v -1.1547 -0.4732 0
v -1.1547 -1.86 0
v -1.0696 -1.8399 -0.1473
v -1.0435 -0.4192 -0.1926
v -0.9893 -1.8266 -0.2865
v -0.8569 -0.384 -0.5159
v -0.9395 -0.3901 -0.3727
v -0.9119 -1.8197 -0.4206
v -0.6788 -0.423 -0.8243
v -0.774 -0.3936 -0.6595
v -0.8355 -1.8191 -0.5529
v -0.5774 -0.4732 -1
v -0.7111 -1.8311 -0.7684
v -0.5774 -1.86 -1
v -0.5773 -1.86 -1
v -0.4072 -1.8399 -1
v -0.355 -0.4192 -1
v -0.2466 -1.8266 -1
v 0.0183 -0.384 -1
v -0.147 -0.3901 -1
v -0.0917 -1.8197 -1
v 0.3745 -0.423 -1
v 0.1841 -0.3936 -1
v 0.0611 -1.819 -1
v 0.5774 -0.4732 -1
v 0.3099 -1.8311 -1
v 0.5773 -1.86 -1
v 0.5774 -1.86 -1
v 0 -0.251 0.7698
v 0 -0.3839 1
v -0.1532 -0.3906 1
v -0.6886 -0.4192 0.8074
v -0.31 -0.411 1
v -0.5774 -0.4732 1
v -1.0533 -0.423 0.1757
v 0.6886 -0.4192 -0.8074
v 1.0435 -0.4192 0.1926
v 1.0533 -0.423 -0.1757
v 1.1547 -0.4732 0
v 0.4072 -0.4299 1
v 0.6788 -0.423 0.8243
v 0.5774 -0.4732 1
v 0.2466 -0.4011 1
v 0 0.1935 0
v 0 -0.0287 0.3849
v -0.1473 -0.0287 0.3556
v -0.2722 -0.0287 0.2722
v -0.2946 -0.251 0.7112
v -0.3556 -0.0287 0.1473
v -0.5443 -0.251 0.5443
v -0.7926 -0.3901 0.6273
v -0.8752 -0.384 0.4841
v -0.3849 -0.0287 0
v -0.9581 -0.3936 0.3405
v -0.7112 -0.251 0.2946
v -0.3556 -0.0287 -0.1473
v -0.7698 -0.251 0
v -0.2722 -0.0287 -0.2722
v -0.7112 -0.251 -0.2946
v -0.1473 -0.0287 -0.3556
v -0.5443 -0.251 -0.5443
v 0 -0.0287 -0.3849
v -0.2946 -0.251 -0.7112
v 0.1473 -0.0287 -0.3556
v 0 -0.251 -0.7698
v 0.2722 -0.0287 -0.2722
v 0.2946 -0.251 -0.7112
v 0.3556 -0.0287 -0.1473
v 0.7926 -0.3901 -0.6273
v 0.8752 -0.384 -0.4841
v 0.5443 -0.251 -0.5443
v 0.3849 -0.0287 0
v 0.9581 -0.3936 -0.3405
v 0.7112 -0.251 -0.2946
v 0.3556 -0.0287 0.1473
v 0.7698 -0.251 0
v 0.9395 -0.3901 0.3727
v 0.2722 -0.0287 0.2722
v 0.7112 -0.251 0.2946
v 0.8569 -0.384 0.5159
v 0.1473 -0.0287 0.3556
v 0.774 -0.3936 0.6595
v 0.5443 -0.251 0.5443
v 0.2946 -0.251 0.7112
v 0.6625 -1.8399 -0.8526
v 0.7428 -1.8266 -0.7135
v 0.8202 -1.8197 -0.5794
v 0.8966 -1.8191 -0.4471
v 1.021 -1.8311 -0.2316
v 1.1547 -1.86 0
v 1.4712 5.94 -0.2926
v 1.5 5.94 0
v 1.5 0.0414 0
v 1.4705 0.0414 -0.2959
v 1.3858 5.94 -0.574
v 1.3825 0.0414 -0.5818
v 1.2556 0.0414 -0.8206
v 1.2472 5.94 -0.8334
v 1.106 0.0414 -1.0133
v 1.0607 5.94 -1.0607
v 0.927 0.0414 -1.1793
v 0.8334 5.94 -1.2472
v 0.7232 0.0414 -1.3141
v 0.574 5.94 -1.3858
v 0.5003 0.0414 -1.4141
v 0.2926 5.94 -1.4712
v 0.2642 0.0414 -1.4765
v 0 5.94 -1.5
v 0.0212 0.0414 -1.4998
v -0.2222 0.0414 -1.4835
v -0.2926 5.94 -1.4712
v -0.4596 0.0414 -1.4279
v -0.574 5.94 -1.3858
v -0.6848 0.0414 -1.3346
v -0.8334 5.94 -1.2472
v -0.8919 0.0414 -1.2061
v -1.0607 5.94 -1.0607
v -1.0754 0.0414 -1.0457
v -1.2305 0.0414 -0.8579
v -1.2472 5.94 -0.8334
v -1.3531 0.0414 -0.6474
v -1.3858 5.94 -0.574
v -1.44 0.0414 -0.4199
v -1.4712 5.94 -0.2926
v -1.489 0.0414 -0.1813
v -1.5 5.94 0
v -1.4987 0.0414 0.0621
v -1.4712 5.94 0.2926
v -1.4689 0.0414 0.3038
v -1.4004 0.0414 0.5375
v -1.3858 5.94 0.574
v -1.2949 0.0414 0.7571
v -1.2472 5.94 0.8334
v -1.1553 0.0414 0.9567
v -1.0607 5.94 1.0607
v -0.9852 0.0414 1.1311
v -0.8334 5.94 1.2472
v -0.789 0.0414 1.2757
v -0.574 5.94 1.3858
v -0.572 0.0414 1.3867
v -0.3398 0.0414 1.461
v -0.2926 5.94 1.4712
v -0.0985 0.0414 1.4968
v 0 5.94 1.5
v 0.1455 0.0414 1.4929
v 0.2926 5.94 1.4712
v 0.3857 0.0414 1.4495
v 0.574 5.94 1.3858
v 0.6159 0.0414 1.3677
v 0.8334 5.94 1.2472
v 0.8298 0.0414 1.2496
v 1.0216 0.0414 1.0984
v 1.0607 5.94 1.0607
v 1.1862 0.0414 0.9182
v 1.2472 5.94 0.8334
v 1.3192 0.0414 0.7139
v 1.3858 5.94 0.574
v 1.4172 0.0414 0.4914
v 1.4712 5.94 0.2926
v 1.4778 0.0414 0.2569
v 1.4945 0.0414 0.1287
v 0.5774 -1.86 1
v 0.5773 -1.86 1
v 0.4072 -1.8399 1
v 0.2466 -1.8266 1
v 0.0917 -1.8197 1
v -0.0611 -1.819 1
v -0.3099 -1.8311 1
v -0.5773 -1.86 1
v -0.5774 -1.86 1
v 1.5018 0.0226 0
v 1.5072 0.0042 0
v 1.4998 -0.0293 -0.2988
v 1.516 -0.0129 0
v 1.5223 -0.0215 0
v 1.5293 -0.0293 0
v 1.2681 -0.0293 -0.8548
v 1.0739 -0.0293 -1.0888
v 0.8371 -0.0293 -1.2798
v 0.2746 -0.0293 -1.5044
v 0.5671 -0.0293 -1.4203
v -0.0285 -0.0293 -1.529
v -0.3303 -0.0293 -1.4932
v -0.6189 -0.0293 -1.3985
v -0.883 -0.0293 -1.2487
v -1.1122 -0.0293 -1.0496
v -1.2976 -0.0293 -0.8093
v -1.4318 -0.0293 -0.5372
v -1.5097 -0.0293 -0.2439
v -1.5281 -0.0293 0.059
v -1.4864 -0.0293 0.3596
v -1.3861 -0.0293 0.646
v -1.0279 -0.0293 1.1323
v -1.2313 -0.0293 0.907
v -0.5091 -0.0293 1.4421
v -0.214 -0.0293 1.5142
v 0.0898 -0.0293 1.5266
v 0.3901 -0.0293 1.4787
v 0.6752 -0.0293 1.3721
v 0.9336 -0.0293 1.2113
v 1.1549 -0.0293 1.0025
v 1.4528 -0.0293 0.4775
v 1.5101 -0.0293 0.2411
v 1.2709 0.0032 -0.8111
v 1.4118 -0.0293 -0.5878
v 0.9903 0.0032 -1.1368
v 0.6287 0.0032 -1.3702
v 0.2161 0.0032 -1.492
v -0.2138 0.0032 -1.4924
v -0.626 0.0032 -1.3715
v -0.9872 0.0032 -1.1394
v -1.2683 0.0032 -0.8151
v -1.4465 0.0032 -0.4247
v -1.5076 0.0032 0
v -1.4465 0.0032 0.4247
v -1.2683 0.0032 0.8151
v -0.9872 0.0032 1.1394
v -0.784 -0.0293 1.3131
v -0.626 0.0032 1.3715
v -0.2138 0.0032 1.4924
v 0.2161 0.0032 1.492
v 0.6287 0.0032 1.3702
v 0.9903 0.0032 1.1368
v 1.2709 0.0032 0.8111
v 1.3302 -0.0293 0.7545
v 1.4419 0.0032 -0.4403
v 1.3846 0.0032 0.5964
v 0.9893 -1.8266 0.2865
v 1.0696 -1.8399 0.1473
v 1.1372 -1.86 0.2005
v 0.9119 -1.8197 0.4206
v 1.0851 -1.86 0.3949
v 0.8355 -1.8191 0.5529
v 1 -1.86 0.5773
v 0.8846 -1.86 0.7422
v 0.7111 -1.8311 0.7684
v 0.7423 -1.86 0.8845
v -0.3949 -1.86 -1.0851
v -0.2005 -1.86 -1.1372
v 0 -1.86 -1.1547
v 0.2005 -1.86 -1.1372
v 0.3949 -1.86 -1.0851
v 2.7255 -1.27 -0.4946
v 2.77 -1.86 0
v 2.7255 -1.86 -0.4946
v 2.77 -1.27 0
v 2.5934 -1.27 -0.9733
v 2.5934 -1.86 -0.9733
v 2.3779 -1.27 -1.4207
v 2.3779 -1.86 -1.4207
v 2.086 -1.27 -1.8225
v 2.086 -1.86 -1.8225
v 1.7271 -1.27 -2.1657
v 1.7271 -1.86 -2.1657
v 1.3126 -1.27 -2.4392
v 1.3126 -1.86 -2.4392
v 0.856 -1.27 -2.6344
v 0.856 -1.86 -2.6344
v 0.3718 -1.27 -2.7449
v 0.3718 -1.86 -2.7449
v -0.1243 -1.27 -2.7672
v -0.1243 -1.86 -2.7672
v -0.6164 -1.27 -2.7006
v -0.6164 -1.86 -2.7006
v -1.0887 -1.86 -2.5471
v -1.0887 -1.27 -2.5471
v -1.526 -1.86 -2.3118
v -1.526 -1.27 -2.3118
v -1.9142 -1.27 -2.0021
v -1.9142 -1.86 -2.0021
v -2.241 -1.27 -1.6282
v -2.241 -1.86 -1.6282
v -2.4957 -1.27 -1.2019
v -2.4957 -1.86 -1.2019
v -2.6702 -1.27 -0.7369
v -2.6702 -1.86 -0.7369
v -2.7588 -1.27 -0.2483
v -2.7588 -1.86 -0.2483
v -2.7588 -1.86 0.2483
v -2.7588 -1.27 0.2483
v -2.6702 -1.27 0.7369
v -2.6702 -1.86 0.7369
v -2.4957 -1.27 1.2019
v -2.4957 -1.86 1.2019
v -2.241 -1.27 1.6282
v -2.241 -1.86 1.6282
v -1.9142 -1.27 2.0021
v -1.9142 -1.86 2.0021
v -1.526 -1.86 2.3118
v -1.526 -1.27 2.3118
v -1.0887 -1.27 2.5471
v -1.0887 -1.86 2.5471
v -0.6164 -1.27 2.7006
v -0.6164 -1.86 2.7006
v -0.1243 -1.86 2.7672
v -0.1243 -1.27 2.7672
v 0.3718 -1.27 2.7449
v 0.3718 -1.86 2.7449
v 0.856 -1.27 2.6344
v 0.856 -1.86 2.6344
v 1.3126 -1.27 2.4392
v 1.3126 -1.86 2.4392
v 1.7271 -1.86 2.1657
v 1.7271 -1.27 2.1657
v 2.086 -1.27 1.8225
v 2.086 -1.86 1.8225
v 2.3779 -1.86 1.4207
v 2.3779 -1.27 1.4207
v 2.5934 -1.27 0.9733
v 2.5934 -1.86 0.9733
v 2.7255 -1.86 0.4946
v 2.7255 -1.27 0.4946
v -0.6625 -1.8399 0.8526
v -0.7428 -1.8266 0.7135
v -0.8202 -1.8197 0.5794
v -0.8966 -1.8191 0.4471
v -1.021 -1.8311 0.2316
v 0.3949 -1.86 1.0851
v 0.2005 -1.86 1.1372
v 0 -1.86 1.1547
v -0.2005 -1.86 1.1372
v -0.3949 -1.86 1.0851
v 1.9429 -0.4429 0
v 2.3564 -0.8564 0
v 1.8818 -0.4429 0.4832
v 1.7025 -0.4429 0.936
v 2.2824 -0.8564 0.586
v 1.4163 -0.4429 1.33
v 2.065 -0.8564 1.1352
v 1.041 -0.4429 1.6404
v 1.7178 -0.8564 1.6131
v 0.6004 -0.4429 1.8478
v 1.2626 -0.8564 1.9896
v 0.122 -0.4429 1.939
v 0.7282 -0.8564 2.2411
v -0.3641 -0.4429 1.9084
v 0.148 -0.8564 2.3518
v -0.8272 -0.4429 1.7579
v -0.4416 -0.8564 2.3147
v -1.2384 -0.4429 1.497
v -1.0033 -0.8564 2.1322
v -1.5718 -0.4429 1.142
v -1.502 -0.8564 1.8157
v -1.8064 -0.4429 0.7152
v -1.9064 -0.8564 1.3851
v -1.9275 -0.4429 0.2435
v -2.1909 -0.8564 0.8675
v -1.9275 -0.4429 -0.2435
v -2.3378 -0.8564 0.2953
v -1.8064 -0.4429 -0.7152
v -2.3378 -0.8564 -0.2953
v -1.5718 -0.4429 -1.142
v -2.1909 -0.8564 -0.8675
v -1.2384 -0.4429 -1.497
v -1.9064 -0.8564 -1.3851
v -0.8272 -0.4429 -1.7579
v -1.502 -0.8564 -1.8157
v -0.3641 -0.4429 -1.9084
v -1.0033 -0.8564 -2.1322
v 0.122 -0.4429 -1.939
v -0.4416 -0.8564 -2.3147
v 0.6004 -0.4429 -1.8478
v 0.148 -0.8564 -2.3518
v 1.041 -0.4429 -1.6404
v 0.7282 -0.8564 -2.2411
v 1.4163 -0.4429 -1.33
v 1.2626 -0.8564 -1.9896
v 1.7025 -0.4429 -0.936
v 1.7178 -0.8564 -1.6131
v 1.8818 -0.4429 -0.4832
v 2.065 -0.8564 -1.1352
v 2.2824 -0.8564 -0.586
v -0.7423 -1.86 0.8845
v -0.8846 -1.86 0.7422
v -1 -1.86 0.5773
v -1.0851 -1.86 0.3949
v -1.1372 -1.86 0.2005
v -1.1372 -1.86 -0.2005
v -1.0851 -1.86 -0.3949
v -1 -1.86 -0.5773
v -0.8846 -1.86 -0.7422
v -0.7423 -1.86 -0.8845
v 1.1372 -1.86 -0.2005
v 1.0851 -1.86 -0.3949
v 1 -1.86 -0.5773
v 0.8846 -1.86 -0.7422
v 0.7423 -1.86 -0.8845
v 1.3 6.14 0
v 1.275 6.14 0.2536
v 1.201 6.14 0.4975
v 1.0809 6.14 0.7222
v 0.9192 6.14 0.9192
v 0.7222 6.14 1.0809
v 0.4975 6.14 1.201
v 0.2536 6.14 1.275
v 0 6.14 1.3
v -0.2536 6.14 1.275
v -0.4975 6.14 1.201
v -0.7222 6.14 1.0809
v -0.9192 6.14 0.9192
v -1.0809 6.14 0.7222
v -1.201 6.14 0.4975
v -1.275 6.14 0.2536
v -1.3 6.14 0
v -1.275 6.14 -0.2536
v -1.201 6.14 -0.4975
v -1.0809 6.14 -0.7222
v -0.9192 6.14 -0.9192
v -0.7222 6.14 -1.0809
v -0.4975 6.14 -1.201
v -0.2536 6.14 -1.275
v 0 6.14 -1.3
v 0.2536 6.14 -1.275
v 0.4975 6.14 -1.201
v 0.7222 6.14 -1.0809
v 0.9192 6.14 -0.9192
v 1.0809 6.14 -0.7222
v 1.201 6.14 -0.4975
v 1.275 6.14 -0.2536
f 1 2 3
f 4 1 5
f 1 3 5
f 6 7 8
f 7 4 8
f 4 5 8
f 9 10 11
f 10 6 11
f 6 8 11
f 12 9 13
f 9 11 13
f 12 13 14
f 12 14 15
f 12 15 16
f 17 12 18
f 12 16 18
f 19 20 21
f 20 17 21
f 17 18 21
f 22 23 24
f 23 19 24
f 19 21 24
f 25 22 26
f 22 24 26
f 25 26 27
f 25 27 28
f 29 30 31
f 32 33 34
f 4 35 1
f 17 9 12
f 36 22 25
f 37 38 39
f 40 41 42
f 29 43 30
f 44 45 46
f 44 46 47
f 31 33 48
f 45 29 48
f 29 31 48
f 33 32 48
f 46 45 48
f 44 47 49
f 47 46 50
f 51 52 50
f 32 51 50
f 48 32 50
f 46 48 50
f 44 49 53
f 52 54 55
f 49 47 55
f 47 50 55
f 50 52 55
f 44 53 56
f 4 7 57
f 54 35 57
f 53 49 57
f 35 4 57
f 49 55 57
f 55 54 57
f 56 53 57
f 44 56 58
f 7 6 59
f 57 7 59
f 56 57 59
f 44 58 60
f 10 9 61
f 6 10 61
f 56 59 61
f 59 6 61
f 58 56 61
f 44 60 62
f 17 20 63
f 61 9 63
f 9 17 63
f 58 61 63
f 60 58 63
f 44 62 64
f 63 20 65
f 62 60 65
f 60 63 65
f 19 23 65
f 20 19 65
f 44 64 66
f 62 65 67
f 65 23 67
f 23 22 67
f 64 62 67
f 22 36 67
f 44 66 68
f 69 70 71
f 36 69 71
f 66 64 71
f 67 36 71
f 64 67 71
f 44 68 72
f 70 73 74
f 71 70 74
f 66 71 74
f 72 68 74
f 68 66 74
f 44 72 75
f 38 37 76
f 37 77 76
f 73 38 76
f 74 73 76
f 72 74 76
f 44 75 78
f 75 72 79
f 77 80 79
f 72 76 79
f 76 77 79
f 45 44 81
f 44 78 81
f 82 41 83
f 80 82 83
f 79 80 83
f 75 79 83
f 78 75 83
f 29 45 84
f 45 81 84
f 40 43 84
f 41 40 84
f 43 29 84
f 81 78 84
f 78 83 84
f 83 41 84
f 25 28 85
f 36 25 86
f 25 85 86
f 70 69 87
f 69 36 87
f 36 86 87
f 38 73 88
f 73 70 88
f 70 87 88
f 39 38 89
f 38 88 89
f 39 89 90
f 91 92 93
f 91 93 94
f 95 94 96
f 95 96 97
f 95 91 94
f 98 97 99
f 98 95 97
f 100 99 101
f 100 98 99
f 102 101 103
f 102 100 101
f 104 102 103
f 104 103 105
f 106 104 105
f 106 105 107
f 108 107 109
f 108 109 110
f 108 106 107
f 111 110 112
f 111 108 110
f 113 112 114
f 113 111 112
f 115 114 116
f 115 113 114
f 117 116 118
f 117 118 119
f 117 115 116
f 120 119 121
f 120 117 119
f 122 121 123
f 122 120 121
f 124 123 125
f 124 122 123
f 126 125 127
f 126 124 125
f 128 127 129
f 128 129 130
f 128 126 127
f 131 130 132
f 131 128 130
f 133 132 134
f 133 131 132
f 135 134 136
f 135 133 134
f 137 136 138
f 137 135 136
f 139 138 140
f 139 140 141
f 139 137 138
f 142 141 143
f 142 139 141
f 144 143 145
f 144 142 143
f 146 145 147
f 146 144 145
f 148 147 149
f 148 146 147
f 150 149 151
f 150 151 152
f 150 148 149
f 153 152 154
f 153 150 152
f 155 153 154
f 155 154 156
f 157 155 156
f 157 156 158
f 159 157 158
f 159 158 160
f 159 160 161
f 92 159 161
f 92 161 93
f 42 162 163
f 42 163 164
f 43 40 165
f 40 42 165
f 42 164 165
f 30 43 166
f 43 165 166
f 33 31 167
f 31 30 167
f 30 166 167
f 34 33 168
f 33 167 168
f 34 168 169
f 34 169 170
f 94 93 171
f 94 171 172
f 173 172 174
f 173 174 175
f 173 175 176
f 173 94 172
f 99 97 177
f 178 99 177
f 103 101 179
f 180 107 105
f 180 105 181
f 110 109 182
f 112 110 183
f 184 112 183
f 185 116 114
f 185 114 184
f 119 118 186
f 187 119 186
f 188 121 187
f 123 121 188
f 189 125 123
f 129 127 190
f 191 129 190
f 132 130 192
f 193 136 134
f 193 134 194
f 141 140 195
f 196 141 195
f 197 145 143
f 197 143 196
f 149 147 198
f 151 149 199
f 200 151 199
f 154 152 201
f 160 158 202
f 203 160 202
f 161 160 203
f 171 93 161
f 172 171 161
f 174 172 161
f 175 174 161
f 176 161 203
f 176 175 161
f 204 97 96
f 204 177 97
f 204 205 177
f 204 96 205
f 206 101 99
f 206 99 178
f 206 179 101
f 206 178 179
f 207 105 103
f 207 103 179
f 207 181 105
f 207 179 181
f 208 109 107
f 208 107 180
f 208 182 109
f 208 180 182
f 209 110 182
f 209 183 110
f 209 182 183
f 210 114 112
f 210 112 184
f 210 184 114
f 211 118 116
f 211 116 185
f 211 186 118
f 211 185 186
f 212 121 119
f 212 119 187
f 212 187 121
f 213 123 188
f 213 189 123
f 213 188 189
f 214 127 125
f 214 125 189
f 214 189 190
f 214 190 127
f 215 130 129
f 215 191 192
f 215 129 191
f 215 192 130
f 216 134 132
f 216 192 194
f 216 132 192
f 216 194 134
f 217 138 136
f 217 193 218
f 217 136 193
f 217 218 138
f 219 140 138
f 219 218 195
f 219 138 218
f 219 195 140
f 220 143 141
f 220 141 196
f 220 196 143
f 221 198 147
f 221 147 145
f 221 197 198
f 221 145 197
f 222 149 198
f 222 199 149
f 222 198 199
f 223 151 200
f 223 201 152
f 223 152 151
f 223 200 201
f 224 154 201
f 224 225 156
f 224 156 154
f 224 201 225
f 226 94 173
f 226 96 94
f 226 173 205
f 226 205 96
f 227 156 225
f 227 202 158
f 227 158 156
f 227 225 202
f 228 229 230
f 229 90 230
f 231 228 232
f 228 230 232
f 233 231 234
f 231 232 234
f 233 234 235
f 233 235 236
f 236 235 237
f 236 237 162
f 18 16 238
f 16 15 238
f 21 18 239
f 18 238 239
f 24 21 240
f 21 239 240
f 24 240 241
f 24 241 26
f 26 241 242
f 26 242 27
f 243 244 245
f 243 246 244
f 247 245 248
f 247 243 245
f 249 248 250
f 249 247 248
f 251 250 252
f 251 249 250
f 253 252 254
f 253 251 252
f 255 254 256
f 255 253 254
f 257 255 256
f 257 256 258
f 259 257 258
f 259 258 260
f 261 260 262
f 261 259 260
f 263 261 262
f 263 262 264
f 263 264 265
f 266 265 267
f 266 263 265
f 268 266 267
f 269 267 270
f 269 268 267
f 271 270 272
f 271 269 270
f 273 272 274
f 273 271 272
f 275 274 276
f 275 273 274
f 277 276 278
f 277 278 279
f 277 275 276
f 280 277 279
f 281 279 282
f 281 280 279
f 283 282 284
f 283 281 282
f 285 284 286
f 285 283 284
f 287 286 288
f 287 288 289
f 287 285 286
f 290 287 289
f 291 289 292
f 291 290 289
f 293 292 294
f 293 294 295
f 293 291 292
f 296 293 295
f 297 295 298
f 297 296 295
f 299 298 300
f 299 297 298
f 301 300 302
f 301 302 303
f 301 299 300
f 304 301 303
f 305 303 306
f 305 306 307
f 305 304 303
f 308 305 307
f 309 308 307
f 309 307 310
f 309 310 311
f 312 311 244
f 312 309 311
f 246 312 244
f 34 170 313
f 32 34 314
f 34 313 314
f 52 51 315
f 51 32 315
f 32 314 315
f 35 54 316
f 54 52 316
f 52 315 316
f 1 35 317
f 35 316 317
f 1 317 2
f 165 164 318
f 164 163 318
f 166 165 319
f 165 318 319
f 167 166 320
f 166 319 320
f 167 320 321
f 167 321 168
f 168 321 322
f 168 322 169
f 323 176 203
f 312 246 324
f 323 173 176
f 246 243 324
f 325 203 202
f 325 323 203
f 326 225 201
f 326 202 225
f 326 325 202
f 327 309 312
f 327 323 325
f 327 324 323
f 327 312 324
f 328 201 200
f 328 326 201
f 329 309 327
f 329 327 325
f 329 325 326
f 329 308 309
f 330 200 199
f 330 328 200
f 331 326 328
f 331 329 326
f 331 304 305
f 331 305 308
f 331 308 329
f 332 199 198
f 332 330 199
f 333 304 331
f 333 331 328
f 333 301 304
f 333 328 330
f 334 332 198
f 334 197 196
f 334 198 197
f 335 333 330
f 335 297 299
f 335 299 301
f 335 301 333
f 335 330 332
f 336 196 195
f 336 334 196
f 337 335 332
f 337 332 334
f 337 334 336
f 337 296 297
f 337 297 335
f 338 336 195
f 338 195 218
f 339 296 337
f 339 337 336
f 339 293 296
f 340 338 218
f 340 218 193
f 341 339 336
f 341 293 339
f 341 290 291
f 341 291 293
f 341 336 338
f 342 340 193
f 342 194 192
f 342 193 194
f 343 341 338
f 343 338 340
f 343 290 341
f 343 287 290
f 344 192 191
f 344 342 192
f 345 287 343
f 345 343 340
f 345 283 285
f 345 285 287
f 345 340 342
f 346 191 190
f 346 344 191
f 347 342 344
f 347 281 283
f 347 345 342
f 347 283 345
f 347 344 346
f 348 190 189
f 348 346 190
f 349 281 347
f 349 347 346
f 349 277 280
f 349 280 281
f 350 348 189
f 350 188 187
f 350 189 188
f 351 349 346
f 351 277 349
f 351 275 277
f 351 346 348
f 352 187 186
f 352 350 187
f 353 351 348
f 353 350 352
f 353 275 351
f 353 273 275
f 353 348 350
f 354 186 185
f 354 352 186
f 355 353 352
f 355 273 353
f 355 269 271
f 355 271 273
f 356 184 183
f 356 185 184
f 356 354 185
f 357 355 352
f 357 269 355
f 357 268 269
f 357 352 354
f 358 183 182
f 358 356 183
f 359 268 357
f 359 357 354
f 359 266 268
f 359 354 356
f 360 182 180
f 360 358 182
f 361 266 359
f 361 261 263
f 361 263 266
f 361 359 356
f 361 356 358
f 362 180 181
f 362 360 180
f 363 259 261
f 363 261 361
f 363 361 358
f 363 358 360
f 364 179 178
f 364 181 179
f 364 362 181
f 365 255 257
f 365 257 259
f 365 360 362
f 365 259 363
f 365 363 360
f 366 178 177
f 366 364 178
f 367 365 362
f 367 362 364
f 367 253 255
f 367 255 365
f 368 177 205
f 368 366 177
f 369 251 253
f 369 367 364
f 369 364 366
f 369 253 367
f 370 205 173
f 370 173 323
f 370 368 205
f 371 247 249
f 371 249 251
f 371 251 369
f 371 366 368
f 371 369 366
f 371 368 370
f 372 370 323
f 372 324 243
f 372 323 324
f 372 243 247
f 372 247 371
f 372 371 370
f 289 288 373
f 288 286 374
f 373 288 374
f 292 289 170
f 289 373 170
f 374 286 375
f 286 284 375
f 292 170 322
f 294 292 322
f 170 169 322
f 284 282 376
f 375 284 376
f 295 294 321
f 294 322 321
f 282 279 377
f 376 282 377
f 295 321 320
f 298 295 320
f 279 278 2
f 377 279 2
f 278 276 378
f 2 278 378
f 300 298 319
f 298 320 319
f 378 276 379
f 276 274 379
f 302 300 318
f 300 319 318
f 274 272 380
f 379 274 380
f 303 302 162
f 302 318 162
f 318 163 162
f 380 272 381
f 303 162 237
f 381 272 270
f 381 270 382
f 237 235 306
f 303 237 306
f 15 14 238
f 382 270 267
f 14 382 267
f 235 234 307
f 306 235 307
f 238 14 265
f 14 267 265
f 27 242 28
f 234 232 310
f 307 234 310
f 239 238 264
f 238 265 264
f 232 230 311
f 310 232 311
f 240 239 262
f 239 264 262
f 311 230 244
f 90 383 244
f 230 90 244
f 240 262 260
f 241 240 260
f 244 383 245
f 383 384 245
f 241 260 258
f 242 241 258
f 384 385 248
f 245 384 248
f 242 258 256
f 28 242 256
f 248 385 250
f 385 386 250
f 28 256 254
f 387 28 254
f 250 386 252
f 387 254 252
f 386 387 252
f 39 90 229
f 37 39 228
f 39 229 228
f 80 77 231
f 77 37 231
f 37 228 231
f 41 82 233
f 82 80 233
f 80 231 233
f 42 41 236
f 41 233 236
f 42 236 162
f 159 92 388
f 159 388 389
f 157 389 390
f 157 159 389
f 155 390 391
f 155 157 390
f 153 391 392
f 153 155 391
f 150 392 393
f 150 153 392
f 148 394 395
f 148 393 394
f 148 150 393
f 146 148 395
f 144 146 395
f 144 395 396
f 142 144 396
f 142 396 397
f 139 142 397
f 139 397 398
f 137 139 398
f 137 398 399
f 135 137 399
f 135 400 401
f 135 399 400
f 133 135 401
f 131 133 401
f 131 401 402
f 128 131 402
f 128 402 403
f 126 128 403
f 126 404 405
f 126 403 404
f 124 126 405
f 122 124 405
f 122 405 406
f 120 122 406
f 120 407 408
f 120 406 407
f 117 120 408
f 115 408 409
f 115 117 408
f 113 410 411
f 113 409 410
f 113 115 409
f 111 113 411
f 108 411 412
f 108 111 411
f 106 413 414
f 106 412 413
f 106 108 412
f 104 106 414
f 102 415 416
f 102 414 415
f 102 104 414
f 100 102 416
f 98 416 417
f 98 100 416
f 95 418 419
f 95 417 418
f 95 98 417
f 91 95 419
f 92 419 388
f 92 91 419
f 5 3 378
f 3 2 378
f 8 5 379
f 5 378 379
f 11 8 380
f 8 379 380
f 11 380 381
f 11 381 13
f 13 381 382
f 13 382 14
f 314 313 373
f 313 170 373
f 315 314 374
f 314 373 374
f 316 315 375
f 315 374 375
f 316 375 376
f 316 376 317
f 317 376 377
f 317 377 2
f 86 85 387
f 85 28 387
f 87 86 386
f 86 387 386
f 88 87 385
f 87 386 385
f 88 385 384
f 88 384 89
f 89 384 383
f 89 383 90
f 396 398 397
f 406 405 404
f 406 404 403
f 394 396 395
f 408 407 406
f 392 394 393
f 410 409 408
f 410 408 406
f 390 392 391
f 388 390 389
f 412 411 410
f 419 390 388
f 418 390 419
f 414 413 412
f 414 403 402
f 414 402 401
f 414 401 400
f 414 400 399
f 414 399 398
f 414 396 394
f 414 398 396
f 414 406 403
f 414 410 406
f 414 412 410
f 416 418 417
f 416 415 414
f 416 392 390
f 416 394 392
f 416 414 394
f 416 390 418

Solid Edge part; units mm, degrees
sketch "Sketch1" plane through (0, 0, 0) normal (0, 0, 1) x (1, 0, 0)
  line L0 (1.5, 0) -> (1.5, 6.14)
  line L1 (0, 6.14) -> (1.5, 6.14)
  line L2 (0, 0) -> (0, 6.14)
  line L3 (0, 0) -> (0, -1.86)
  line L4 (0, -1.86) -> (2.77, -1.86)
  line L5 (2.77, -1.86) -> (2.77, -1.27)
  line L6 (2.77, -1.27) -> (1.5, 0)
revolve "RevolvedProtrusion1" add sketch "Sketch1" angle 360 about axis through (0, 0, 0) along (0, 1, 0)
sketch "Sketch2" plane through (0, 0, 0) normal (1, 0, 0) x (0, 1, 0)
  line L0 (-1.86, 1.6515) -> (-0.76, 1.6515)
  line L1 (0.1935, 0) -> (-0.76, 1.6515)
  line L2 (-1.86, 0) -> (0.1935, 0)
  line L3 (-1.86, 0) -> (-1.86, 1.6515)
revolve "RevolvedCutout1" cut sketch "Sketch2" angle 360 about axis through (0, -4.5, 0) along (0, 1, 0)
sketch "Sketch3" plane through (0, -1.86, 0) normal (0, -1, 0) x (0, 0, 1)
  circle A0 centre (0, 0) radius 1.6515
  line L0 (-1, -0.5774) -> (0, -1.1547)
  line L1 (0, -1.1547) -> (1, -0.5774)
  line L2 (1, -0.5774) -> (1, 0.5774)
  line L3 (1, 0.5774) -> (0, 1.1547)
  line L4 (0, 1.1547) -> (-1, 0.5774)
  line L5 (-1, 0.5774) -> (-1, -0.5774)
  dimension "D1" = 2
extrude "Protrusion1" add sketch "Sketch3" against normal up to next
sketch "Sketch4" plane through (0, 0, 0) normal (0, 0, 1) x (1, 0, 0)
  line L0 (-1.1547, -1.86) -> (0, -1.86)
  line L1 (0, -1.86) -> (0, -1.5506)
  line L2 (0, -1.5506) -> (-1.1547, -1.86)
revolve "RevolvedCutout2" cut sketch "Sketch4" angle 360 about axis through (0, -4.5, 0) along (0, 1, 0)
fillet "Round1" radius 0.1 1 edges at (0, 0, -1.5)
chamfer "倒斜角_2" distance 0.2 angle 45 1 edges at (0, 6.14, -1.5)
cosmetic_thread "Thread1" size "M3"
